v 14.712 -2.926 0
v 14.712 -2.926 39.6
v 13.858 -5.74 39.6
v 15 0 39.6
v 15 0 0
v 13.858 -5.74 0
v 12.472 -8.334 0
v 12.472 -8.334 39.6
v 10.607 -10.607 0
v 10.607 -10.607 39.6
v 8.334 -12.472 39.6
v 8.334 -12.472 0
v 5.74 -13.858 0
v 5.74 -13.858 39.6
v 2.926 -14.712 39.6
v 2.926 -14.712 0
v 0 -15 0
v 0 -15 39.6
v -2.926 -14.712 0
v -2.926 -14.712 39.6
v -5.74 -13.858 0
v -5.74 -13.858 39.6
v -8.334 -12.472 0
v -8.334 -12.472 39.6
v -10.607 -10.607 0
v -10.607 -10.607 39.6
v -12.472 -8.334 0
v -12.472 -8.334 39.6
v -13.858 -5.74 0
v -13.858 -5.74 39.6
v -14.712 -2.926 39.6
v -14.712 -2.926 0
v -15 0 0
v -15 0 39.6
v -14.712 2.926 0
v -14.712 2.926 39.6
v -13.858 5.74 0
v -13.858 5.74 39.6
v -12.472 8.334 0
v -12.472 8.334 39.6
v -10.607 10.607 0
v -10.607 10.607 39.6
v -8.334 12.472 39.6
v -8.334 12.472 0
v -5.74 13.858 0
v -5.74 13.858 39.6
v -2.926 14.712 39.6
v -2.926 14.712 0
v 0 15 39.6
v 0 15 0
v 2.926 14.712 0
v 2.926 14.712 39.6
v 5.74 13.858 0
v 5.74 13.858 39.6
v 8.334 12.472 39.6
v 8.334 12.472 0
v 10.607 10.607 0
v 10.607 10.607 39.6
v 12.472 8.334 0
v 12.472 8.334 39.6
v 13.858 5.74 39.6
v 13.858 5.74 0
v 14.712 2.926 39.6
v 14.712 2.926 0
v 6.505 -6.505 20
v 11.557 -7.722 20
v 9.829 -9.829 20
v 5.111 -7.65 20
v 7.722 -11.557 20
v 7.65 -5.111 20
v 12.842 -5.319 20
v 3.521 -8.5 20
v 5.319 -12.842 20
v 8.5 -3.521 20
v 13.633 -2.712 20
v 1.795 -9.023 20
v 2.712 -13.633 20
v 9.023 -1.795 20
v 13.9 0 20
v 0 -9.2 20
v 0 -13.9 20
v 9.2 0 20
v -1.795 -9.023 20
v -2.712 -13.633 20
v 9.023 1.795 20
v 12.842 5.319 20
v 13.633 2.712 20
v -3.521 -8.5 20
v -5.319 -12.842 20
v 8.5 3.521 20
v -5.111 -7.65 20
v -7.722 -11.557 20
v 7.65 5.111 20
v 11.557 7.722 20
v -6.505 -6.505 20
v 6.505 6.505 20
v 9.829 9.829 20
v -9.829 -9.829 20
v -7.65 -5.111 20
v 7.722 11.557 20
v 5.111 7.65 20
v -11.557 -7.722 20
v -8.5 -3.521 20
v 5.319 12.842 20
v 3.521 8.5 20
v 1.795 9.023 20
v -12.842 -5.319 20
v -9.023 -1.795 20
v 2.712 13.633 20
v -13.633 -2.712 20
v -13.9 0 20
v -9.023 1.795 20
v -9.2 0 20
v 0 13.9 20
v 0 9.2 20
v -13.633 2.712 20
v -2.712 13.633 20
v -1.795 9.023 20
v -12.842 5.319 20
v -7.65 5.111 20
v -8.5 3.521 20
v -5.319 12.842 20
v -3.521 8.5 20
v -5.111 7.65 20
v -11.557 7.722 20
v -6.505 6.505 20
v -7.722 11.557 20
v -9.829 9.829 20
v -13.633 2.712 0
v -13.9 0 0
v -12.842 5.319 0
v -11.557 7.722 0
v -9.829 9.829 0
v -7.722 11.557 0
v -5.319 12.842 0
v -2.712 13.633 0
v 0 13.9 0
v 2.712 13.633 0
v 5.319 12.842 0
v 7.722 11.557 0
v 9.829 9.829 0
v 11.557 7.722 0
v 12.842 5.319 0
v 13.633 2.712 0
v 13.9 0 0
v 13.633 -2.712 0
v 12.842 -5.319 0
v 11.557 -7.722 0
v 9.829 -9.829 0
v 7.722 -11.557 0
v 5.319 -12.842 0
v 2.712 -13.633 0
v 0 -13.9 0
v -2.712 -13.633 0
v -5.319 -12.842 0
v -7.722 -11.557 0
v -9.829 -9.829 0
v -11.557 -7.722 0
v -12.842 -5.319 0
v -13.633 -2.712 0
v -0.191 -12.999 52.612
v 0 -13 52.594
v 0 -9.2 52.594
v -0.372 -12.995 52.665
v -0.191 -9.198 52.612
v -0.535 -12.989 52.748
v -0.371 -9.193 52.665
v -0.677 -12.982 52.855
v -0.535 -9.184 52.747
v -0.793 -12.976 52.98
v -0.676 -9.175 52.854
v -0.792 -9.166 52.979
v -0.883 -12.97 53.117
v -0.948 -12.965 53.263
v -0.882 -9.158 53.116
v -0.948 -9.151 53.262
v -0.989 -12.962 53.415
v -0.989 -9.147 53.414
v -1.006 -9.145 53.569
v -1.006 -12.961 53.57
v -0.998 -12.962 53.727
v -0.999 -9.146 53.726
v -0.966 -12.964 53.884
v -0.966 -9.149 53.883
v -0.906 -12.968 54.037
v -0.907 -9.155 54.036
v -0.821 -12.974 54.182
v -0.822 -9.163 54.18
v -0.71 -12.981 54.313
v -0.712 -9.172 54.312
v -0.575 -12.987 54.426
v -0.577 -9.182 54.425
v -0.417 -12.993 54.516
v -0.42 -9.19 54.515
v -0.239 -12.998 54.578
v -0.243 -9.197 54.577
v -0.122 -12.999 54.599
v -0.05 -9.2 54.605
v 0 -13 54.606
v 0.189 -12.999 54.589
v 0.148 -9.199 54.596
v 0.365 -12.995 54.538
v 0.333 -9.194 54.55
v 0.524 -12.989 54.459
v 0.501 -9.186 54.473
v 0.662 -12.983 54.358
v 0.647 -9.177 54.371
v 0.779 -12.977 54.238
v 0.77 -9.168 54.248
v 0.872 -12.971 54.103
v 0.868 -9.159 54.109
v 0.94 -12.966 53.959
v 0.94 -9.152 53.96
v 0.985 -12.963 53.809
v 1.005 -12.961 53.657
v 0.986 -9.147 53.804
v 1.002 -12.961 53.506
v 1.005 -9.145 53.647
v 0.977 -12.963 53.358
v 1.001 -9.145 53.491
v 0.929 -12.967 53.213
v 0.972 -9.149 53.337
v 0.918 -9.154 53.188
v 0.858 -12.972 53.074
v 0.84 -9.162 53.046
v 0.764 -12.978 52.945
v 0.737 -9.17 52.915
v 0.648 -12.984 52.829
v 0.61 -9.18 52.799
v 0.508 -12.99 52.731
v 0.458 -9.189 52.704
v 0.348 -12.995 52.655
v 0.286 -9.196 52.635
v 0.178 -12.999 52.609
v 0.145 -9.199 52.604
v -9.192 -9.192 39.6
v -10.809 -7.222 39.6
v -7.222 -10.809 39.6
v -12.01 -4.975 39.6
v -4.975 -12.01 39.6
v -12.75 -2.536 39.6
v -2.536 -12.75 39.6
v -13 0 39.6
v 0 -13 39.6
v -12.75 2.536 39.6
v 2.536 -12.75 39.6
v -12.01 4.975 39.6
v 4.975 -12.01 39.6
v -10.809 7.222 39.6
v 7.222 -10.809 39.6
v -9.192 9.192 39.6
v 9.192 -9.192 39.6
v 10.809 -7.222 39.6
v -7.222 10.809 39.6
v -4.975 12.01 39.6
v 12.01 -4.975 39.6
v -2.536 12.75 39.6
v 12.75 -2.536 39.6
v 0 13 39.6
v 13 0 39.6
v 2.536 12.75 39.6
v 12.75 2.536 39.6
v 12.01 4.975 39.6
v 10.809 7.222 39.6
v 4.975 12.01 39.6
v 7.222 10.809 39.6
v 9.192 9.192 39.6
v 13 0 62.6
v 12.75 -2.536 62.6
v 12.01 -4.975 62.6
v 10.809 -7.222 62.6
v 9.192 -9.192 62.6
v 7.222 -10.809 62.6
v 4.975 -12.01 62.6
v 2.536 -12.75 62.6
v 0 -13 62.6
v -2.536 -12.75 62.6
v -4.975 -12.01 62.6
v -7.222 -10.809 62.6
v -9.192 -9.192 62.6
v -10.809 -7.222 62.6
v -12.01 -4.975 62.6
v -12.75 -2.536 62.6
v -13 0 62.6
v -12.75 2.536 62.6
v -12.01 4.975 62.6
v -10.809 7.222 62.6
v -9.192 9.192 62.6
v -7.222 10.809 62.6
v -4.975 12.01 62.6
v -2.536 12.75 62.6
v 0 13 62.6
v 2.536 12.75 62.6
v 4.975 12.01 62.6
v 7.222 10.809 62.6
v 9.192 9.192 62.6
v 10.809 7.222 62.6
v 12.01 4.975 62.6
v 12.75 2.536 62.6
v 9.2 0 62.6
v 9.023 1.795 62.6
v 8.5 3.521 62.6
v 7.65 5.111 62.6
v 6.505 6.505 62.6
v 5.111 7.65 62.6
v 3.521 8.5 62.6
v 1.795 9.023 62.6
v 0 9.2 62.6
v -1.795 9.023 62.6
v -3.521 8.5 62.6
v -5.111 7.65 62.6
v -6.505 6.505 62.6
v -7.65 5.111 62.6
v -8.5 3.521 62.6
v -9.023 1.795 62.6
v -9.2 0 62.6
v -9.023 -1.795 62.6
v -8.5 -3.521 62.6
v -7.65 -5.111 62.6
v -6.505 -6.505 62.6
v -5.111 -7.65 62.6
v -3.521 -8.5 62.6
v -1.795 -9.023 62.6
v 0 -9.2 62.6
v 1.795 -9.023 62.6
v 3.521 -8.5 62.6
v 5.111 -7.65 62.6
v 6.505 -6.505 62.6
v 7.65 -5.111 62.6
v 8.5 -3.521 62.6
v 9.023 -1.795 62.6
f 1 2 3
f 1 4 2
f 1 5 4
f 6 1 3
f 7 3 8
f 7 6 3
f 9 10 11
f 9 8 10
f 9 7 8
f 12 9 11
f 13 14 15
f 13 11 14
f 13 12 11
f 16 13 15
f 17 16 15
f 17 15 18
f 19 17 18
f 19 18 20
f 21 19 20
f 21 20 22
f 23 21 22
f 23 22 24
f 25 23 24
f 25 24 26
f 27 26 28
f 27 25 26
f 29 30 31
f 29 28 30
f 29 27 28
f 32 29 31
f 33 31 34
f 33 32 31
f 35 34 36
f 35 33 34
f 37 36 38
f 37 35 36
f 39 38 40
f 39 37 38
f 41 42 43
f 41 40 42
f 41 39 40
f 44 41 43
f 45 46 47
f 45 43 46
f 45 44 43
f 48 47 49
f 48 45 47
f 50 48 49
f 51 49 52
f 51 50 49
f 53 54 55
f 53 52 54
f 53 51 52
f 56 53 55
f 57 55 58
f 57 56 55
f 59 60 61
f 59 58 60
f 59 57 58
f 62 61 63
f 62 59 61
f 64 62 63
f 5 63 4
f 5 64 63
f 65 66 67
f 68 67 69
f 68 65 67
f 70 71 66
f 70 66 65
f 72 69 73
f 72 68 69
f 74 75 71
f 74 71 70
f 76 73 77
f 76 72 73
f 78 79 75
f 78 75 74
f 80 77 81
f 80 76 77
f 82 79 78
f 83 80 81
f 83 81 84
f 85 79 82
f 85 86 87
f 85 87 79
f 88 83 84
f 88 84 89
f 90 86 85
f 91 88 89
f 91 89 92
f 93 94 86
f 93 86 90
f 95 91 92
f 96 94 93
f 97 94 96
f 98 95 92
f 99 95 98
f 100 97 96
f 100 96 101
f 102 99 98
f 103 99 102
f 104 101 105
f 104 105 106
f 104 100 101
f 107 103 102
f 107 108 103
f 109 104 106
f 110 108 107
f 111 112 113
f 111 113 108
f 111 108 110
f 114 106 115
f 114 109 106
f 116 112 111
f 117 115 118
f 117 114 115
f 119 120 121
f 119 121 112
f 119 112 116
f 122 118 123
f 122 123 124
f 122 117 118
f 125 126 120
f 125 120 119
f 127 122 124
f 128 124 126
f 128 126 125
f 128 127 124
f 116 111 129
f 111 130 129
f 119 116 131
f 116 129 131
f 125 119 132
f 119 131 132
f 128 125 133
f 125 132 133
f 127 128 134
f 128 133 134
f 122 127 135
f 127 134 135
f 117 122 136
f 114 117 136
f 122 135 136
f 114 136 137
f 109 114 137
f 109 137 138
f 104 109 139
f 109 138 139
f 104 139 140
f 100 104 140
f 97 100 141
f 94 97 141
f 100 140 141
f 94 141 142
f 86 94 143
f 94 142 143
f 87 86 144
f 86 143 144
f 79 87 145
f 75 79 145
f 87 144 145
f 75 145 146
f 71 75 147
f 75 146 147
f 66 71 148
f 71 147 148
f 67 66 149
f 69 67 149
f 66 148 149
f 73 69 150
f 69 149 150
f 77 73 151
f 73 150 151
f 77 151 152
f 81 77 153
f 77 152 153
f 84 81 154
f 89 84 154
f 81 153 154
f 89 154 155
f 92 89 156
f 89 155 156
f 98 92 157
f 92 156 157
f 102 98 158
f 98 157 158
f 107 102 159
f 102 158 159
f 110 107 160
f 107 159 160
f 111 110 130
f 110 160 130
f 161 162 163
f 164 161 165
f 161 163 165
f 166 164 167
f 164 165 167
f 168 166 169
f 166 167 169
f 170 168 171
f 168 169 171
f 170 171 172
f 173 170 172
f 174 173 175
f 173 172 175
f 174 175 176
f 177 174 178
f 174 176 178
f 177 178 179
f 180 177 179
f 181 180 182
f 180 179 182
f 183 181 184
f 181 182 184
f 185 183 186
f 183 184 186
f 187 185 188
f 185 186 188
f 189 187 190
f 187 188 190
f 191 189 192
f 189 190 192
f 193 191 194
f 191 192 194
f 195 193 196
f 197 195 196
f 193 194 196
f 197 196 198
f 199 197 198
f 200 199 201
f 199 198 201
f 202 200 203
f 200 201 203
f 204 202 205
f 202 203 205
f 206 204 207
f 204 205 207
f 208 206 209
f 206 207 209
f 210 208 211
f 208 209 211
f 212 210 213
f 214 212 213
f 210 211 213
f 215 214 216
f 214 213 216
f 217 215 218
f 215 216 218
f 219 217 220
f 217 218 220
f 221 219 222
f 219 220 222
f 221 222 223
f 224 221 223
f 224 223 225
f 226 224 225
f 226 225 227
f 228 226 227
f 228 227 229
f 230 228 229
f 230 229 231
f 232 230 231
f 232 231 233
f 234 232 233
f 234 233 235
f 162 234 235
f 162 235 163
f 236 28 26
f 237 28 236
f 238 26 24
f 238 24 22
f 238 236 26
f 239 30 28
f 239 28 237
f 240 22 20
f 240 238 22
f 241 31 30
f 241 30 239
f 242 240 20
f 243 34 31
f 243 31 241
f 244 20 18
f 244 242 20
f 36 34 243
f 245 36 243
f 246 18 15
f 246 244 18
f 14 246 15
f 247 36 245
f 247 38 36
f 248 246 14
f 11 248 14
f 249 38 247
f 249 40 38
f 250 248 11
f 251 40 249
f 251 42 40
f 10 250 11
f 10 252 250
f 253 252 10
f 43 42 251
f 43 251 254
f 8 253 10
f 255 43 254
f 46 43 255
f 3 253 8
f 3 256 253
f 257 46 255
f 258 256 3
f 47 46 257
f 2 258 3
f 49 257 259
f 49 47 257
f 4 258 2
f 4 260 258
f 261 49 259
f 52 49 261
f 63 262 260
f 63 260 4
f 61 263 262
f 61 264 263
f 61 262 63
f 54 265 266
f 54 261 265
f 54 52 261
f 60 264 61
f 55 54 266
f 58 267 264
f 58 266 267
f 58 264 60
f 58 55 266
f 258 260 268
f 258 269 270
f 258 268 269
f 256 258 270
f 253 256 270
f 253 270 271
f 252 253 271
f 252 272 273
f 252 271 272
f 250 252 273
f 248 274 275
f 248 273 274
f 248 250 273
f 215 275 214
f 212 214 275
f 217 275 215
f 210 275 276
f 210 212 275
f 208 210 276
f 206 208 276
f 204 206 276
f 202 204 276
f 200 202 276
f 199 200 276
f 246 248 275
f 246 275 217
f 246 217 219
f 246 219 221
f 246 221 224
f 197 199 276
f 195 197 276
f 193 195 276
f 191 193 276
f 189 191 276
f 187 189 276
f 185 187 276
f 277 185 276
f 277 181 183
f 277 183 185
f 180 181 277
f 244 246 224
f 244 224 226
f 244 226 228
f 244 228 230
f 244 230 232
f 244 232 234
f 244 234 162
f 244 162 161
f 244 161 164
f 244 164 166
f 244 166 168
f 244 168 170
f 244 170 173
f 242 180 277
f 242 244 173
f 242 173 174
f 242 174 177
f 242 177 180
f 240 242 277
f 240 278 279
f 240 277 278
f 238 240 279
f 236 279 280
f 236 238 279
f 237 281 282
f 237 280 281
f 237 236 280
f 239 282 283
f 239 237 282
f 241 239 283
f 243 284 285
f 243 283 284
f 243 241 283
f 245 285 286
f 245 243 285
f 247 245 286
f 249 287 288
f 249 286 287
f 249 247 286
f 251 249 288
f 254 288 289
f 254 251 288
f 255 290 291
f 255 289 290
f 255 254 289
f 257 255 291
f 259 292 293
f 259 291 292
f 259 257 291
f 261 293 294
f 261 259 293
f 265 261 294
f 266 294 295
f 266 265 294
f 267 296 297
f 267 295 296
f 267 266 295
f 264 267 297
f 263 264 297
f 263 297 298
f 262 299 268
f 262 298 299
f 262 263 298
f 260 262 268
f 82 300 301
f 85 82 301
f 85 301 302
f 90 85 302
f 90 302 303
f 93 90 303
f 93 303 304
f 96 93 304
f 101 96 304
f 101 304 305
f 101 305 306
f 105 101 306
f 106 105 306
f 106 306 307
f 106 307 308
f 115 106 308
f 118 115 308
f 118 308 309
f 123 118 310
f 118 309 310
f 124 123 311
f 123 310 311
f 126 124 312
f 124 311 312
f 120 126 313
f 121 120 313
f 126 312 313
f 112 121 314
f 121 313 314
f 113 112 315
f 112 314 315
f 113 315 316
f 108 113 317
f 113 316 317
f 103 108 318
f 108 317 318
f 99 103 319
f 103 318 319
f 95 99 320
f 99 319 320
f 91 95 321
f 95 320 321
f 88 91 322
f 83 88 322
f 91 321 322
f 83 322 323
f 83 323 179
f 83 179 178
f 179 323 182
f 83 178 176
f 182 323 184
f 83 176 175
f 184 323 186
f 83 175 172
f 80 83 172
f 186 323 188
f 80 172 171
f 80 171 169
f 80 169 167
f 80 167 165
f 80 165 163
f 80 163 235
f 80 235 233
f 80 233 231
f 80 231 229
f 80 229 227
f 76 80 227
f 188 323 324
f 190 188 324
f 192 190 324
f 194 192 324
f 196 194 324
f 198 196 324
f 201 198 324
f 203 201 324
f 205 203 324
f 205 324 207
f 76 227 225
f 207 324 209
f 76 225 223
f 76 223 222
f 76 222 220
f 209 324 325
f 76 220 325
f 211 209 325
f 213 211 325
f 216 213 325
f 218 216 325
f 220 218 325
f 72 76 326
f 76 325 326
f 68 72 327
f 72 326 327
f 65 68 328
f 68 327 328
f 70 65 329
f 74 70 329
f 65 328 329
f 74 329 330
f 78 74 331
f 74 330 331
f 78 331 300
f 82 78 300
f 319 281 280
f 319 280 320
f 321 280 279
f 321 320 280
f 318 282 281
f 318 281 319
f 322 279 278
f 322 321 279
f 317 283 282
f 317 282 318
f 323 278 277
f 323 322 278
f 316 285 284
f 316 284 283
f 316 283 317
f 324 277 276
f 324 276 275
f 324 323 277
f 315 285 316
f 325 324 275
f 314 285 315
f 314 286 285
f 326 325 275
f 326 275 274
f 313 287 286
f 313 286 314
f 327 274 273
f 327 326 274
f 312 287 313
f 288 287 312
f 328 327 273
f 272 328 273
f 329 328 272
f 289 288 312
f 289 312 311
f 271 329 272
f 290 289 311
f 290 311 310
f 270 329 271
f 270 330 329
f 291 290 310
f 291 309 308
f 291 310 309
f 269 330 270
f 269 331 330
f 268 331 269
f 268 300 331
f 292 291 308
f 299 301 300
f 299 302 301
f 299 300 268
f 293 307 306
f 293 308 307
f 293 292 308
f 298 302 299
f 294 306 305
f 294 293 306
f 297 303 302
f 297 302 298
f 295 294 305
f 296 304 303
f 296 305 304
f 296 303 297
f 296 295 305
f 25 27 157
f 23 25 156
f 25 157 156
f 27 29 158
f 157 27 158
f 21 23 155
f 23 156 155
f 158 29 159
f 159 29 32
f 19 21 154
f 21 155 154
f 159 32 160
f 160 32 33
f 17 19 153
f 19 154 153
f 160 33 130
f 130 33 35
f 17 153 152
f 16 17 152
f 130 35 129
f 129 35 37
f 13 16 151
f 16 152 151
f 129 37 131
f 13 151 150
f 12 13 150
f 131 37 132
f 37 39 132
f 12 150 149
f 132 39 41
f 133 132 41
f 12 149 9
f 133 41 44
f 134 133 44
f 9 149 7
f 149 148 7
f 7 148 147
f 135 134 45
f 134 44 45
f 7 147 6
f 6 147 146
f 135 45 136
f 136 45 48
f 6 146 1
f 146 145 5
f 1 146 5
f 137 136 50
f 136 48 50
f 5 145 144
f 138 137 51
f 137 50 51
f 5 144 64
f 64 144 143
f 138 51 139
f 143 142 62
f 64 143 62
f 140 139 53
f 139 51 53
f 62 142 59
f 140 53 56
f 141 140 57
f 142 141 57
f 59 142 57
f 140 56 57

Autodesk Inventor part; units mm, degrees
ref_plane "YZ Plane" through (0, 0, 0) normal (1, 0, 0) x (0, 1, 0)
ref_plane "XY Plane" through (0, 0, 0) normal (0, 0, 1) x (1, 0, 0)
sketch "Skizze1" plane through (0, 0, 0) normal (0, 0, 1) x (1, 0, 0)
  circle A0 centre (0, 0) radius 15
  dimension "d0" = 30
extrude "Extrusion1" add sketch "Skizze1" along normal blind 39.6
sketch "Skizze2" plane through (0, 0, 39.6) normal (0, 0, 1) x (1, 0, 0)
  circle A0 centre (0, 0) radius 13
  dimension "d3" = 26
extrude "Extrusion2" add sketch "Skizze2" along normal blind 23
sketch "Skizze5" plane through (0, 0, 62.6) normal (0, 0, 1) x (1, 0, 0)
  circle A0 centre (0, 0) radius 9.2
  dimension "d6" = 18.4
extrude "Extrusion3" cut sketch "Skizze5" against normal through all
sketch "Skizze6" plane through (0, 0, 0) normal (0, 0, -1) x (-1, 0, 0)
  circle A0 centre (0, 0) radius 13.9
  dimension "d9" = 27.8
extrude "Extrusion4" cut sketch "Skizze6" against normal blind 20
ref_plane "Arbeitsebene1" through (0, -13, 39.6) normal (0, 1, 0) x (-1, 0, 0)
sketch "Skizze7" plane through (0, -13, 39.6) normal (0, 1, 0) x (-1, 0, 0)
  line L0 (13, 23) -> (-13, 23) projected
  line L1 (-9.2, 23) -> (9.2, 23) construction
  line L2 (0, 23) -> (0, 14) construction
  point P0 (0, -39.6)
  dimension "d12" = 9
hole "Bohrung1" at (0, -13, 53.6) direction (0, 1, 0) diameter 2.013 end up to surface thread size "M2.5x0.45" class "6H" standard "ISO Metric profile"
properties part number "tubus lense (423606-8031)"
